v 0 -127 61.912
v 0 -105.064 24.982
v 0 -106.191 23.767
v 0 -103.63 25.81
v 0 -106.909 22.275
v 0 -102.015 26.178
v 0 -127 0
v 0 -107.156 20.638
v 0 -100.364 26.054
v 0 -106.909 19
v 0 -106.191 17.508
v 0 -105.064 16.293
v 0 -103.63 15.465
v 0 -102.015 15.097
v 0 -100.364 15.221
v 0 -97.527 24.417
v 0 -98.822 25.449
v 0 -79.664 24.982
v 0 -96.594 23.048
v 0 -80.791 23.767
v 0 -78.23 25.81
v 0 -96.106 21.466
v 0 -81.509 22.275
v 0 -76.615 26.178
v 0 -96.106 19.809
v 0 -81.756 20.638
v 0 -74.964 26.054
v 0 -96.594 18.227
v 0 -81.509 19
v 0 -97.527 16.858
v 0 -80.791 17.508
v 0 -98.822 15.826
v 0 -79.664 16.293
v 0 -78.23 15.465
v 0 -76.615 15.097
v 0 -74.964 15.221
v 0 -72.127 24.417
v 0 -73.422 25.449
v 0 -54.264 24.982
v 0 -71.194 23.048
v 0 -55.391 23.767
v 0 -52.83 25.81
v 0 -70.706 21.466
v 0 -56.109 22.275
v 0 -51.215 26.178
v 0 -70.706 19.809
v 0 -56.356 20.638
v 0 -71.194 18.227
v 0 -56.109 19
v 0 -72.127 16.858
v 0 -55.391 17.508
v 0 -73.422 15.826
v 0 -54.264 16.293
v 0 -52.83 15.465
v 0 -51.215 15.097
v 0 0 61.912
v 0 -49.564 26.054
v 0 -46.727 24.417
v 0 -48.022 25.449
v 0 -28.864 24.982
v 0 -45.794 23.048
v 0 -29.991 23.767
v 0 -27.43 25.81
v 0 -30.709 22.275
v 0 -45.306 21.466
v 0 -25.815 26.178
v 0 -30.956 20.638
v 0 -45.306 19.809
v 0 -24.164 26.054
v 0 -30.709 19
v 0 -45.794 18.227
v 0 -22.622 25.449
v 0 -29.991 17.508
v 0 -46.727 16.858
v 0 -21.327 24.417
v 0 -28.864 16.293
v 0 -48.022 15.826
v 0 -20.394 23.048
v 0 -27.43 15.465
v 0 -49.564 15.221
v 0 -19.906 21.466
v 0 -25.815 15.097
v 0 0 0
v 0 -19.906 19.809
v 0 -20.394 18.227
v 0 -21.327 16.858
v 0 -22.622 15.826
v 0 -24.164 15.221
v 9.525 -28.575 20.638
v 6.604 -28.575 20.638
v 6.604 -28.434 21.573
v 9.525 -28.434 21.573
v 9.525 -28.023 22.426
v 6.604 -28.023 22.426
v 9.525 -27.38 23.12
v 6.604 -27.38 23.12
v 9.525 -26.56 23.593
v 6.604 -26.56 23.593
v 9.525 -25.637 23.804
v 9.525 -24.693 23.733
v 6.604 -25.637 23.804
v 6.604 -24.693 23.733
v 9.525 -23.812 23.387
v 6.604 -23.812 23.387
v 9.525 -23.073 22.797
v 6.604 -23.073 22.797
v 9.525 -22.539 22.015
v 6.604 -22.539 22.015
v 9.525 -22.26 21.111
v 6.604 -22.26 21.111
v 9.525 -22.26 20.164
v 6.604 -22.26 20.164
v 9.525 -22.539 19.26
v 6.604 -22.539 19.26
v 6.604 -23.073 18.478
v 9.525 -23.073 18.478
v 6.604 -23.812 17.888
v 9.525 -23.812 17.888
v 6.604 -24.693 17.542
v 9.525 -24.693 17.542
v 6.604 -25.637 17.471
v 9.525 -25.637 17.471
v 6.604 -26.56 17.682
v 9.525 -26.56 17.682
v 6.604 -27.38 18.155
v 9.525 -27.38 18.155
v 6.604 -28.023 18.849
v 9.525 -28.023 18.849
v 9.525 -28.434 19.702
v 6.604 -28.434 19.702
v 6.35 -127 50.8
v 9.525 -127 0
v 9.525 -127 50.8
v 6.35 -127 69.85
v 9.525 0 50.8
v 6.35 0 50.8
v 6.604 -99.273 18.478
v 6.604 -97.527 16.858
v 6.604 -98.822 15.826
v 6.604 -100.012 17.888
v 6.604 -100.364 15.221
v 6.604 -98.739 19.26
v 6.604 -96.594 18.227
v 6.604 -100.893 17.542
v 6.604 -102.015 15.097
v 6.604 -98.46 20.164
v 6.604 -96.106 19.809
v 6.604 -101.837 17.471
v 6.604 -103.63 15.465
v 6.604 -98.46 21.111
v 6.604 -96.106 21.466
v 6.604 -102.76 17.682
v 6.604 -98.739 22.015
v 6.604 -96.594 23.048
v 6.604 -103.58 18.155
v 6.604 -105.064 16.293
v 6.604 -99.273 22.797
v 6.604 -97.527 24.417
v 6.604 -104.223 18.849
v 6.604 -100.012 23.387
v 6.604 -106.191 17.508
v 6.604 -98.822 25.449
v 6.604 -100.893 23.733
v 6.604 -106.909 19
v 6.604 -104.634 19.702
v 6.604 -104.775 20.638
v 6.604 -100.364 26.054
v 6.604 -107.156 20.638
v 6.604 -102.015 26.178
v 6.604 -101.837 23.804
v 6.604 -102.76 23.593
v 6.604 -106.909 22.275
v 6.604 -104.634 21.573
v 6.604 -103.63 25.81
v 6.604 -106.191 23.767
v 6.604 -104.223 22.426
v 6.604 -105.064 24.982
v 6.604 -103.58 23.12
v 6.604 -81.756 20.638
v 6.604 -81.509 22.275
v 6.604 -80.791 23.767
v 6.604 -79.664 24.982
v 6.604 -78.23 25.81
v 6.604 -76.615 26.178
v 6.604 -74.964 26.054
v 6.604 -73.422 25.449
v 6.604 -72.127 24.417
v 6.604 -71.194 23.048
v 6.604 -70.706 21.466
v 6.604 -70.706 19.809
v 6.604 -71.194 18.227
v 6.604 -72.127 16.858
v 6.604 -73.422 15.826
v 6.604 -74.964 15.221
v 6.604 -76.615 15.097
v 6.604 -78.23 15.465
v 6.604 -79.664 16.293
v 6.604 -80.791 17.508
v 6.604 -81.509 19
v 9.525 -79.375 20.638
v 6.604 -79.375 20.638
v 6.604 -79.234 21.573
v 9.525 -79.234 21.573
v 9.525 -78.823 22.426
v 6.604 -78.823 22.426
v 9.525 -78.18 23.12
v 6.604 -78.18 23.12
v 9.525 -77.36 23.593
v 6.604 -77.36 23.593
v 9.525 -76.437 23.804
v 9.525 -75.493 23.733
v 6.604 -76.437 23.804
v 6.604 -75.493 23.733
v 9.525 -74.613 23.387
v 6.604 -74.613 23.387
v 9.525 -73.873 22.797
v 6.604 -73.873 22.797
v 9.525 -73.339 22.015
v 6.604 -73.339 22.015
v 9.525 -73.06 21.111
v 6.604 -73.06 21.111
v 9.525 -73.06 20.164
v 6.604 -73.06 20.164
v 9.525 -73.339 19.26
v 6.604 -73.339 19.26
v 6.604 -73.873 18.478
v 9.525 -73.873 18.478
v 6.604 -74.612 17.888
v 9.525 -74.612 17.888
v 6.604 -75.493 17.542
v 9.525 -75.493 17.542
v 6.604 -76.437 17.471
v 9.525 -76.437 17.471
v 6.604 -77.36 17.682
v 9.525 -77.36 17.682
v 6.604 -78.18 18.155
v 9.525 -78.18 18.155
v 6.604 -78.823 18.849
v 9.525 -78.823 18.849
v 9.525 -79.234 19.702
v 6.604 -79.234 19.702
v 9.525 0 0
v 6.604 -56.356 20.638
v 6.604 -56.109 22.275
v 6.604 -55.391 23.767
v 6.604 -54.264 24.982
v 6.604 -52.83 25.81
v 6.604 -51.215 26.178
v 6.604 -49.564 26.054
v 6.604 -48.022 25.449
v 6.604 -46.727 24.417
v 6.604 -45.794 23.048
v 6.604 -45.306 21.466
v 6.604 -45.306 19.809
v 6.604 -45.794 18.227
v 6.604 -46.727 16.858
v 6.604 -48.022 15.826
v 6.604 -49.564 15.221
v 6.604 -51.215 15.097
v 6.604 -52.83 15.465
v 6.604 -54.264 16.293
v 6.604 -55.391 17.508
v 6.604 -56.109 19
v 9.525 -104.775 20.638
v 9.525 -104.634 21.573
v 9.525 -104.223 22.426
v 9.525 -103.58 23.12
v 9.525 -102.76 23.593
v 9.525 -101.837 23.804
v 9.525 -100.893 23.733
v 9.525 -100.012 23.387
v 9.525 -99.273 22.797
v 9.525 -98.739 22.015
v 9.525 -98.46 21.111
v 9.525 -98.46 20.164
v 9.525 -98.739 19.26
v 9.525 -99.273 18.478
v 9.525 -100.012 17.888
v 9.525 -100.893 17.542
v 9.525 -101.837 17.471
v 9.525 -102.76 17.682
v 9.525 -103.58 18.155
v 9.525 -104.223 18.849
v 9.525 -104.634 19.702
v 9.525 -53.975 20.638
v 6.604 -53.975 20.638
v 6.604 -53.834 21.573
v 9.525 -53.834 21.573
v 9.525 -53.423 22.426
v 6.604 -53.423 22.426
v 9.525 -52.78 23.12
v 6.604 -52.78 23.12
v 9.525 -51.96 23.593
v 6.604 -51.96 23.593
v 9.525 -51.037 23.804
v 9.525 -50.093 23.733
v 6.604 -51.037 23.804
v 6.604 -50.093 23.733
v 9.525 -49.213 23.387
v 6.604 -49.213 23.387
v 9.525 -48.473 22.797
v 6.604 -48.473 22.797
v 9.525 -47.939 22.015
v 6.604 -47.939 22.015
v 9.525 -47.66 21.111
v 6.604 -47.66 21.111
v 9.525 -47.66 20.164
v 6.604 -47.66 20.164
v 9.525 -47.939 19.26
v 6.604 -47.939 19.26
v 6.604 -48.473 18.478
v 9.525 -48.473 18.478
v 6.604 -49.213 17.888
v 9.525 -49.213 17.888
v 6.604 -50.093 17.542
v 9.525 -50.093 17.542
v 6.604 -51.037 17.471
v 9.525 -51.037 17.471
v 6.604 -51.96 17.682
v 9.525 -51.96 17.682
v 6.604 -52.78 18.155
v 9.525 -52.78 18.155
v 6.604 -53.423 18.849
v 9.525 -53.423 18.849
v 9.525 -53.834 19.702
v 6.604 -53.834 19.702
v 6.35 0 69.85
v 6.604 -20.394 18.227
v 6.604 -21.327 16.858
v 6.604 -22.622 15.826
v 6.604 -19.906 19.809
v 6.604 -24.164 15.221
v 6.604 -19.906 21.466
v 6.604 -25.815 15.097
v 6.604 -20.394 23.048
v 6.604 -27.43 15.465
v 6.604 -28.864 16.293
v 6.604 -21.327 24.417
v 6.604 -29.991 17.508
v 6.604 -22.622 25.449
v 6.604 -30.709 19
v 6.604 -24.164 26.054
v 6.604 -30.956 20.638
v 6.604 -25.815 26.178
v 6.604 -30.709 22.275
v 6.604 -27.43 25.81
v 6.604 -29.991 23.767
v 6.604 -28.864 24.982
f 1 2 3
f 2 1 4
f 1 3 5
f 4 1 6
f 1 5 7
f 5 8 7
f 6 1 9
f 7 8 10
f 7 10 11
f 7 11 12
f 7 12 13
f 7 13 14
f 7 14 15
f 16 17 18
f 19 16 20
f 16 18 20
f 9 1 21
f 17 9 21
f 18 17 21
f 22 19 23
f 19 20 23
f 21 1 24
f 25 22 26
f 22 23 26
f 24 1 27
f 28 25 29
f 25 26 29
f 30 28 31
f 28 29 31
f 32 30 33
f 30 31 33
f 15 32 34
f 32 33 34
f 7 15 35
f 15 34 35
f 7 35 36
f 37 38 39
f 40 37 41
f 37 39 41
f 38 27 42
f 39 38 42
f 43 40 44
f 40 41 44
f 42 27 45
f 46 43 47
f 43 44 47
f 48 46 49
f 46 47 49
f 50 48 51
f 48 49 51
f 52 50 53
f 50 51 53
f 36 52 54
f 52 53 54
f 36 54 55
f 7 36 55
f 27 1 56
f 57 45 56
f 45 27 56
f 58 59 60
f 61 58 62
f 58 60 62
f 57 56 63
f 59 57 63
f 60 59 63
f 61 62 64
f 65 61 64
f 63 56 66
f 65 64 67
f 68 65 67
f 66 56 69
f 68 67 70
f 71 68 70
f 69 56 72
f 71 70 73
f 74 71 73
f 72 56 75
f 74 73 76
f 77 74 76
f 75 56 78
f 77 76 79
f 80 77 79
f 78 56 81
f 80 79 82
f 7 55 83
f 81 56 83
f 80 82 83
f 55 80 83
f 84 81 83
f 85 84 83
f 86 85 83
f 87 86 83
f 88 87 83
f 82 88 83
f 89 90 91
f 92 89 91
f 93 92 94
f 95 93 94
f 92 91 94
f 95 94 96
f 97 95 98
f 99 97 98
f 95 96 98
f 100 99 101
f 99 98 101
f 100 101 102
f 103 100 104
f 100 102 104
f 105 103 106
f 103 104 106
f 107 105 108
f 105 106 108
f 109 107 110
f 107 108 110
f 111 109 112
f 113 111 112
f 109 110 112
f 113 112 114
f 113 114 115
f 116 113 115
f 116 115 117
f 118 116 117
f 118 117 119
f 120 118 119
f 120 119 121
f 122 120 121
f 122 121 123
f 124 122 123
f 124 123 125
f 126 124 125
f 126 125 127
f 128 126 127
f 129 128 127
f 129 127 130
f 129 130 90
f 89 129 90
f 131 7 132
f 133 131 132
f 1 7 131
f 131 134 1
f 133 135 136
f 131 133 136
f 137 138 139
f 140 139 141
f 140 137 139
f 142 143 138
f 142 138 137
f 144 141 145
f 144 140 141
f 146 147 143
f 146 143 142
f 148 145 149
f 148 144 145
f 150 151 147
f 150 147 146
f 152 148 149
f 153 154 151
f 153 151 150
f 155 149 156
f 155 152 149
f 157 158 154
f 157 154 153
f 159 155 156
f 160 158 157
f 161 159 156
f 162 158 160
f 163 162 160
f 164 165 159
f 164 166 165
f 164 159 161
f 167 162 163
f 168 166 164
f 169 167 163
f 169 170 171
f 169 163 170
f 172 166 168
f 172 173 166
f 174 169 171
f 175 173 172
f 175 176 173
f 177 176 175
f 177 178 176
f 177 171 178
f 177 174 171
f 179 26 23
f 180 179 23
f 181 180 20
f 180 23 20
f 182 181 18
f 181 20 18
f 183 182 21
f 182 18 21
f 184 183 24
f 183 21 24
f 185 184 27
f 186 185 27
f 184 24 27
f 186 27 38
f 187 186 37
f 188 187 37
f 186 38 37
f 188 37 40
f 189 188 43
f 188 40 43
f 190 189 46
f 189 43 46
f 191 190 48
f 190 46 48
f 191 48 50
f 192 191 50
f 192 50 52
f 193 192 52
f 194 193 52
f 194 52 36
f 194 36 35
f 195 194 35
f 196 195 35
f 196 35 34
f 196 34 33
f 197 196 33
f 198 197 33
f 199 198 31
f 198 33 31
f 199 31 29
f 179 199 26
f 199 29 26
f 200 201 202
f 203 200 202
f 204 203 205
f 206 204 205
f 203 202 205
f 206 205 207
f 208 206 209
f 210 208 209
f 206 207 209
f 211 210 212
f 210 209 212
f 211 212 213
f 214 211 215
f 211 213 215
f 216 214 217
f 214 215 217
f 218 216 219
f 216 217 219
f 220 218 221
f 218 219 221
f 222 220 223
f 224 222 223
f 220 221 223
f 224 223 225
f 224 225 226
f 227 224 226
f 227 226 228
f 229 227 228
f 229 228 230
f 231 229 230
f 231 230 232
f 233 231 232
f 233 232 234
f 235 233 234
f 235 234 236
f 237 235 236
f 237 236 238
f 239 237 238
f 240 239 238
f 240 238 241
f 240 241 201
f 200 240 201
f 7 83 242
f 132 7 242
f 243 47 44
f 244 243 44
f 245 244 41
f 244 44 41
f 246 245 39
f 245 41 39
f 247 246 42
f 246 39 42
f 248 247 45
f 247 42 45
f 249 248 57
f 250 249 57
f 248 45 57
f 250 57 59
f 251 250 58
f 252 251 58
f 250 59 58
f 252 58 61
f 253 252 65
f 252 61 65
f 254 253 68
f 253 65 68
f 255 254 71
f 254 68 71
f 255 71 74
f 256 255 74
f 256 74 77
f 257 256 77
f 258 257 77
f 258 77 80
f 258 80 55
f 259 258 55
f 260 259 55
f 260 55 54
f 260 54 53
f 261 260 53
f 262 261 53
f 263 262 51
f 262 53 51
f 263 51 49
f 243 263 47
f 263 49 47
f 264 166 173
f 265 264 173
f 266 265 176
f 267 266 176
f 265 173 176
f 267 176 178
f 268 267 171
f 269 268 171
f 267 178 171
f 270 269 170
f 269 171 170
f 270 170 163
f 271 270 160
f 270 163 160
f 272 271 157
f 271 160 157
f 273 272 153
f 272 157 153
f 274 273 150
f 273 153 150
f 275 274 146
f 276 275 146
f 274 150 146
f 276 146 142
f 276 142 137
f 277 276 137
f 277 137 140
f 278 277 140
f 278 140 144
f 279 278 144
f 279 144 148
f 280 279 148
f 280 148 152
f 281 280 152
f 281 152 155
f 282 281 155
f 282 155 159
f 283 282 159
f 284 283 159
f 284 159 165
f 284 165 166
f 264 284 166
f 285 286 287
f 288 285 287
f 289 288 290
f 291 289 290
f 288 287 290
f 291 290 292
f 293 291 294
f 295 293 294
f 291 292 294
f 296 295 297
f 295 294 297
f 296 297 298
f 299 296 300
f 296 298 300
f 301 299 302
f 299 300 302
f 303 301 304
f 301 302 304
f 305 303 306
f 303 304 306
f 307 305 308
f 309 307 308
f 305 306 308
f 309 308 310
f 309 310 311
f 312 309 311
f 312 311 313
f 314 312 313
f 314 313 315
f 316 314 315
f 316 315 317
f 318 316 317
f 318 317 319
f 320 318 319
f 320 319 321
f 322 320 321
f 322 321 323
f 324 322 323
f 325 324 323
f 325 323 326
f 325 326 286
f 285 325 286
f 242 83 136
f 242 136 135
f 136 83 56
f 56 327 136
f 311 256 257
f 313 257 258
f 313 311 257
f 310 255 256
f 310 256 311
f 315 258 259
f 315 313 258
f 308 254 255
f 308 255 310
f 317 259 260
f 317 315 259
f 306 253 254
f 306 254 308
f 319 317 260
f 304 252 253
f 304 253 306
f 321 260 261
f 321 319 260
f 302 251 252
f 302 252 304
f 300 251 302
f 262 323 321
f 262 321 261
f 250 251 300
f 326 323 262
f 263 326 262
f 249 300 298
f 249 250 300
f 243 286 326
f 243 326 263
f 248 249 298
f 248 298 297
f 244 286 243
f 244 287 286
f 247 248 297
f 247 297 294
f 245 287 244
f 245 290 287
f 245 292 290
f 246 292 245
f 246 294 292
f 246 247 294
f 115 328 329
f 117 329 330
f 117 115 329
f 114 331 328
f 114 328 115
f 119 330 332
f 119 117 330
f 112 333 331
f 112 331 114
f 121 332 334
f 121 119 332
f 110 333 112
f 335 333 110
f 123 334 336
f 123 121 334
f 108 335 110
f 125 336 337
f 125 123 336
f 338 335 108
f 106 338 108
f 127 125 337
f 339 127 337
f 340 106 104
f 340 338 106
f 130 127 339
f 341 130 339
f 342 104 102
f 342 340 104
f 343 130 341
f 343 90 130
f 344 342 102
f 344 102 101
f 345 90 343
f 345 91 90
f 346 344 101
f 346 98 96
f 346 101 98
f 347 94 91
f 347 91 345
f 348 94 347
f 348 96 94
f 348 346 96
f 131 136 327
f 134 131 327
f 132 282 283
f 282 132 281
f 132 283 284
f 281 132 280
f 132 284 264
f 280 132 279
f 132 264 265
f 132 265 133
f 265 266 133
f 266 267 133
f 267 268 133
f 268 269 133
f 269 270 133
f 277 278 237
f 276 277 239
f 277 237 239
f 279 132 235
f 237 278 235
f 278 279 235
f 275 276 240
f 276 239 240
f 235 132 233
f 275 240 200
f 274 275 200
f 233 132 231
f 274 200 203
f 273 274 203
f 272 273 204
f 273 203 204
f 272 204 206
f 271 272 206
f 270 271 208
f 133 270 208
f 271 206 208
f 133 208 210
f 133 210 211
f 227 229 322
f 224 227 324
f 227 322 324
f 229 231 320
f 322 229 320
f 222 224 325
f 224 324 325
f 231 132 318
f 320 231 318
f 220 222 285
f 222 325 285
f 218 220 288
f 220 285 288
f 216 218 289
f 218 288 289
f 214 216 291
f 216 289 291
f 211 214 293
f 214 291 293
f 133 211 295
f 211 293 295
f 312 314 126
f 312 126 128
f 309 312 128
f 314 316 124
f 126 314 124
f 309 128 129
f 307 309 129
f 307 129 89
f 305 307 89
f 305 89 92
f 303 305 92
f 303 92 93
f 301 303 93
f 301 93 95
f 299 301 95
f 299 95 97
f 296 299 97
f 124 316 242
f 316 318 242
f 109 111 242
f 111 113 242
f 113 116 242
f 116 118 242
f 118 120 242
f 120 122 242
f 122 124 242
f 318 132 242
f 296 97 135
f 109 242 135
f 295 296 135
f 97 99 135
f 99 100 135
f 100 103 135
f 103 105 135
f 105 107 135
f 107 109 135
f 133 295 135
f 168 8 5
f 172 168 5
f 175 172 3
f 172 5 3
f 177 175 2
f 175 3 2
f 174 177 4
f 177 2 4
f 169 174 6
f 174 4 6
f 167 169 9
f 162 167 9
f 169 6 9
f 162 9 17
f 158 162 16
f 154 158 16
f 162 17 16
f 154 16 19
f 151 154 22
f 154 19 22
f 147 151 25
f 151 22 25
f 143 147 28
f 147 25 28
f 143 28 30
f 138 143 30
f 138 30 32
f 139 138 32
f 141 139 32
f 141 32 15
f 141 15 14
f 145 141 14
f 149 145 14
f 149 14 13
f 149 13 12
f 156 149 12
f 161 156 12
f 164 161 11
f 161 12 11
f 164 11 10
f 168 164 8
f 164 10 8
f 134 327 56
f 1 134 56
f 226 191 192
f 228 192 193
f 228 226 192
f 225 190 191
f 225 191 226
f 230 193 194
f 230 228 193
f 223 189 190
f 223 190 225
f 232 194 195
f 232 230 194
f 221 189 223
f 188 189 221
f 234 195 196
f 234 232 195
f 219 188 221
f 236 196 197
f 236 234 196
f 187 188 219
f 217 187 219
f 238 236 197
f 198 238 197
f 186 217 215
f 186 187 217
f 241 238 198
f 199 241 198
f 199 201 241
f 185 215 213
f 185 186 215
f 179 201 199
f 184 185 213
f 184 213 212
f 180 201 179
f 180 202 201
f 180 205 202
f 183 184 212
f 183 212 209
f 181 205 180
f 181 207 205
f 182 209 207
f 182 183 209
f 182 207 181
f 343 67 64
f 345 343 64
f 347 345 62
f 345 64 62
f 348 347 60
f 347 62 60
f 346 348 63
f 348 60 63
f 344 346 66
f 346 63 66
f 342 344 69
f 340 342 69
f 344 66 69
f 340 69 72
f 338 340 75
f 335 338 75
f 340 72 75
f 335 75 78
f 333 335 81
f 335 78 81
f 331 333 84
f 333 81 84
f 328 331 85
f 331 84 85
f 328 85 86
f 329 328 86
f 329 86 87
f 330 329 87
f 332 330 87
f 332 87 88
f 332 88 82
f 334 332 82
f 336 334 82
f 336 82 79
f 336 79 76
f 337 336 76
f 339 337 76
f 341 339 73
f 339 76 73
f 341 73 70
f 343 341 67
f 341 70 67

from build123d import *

# Parameters (mm, degrees)
F1_DEPTH = 127
F3_DEPTH = 25.4
F4_R     = 5.55625
F5_DEPTH = 6.604


with BuildPart() as f1:
    # F0 (on Front) → F1 (new body)
    with BuildSketch(Plane.XZ):
        Polygon((0, 61.9125), (0, 0), (9.525, 0), (9.525, 50.8), (6.35, 50.8), (6.35, 69.85), align=None)
    extrude(amount=F1_DEPTH)

    # F2 (on face) → F3 (cut)
    with BuildSketch(Plane(origin=(0, 0, 0), x_dir=(0, -1, 0), z_dir=(-1, 0, 0))):
        with BuildLine():
            ThreePointArc((98.425, 20.6375), (101.6, 17.4625), (104.775, 20.6375))
            Line((104.775, 20.6375), (98.425, 20.6375))
        make_face()
        with BuildLine():
            Line((98.425, 20.6375), (104.775, 20.6375))
            ThreePointArc((104.775, 20.6375), (101.6, 23.8125), (98.425, 20.6375))
        make_face()
        with BuildLine():
            ThreePointArc((22.225, 20.6375), (25.4, 17.4625), (28.575, 20.6375))
            Line((28.575, 20.6375), (22.225, 20.6375))
        make_face()
        with BuildLine():
            Line((22.225, 20.6375), (28.575, 20.6375))
            ThreePointArc((28.575, 20.6375), (25.4, 23.8125), (22.225, 20.6375))
        make_face()
        with BuildLine():
            ThreePointArc((47.625, 20.6375), (50.8, 17.4625), (53.975, 20.6375))
            Line((53.975, 20.6375), (47.625, 20.6375))
        make_face()
        with BuildLine():
            Line((47.625, 20.6375), (53.975, 20.6375))
            ThreePointArc((53.975, 20.6375), (50.8, 23.8125), (47.625, 20.6375))
        make_face()
        with BuildLine():
            ThreePointArc((73.025, 20.6375), (76.2, 17.4625), (79.375, 20.6375))
            Line((79.375, 20.6375), (73.025, 20.6375))
        make_face()
        with BuildLine():
            Line((73.025, 20.6375), (79.375, 20.6375))
            ThreePointArc((79.375, 20.6375), (76.2, 23.8125), (73.025, 20.6375))
        make_face()
    extrude(amount=-F3_DEPTH, mode=Mode.SUBTRACT)

    # F4 (on face) → F5 (cut)
    with BuildSketch(Plane(origin=(0, 0, 0), x_dir=(0, -1, 0), z_dir=(-1, 0, 0))):
        with Locations((101.6, 20.6375)):
            Circle(F4_R)
        with Locations((76.2, 20.6375)):
            Circle(F4_R)
        with Locations((50.8, 20.6375)):
            Circle(F4_R)
        with Locations((25.4, 20.6375)):
            Circle(F4_R)
    extrude(amount=-F5_DEPTH, mode=Mode.SUBTRACT)


solid = f1.part
